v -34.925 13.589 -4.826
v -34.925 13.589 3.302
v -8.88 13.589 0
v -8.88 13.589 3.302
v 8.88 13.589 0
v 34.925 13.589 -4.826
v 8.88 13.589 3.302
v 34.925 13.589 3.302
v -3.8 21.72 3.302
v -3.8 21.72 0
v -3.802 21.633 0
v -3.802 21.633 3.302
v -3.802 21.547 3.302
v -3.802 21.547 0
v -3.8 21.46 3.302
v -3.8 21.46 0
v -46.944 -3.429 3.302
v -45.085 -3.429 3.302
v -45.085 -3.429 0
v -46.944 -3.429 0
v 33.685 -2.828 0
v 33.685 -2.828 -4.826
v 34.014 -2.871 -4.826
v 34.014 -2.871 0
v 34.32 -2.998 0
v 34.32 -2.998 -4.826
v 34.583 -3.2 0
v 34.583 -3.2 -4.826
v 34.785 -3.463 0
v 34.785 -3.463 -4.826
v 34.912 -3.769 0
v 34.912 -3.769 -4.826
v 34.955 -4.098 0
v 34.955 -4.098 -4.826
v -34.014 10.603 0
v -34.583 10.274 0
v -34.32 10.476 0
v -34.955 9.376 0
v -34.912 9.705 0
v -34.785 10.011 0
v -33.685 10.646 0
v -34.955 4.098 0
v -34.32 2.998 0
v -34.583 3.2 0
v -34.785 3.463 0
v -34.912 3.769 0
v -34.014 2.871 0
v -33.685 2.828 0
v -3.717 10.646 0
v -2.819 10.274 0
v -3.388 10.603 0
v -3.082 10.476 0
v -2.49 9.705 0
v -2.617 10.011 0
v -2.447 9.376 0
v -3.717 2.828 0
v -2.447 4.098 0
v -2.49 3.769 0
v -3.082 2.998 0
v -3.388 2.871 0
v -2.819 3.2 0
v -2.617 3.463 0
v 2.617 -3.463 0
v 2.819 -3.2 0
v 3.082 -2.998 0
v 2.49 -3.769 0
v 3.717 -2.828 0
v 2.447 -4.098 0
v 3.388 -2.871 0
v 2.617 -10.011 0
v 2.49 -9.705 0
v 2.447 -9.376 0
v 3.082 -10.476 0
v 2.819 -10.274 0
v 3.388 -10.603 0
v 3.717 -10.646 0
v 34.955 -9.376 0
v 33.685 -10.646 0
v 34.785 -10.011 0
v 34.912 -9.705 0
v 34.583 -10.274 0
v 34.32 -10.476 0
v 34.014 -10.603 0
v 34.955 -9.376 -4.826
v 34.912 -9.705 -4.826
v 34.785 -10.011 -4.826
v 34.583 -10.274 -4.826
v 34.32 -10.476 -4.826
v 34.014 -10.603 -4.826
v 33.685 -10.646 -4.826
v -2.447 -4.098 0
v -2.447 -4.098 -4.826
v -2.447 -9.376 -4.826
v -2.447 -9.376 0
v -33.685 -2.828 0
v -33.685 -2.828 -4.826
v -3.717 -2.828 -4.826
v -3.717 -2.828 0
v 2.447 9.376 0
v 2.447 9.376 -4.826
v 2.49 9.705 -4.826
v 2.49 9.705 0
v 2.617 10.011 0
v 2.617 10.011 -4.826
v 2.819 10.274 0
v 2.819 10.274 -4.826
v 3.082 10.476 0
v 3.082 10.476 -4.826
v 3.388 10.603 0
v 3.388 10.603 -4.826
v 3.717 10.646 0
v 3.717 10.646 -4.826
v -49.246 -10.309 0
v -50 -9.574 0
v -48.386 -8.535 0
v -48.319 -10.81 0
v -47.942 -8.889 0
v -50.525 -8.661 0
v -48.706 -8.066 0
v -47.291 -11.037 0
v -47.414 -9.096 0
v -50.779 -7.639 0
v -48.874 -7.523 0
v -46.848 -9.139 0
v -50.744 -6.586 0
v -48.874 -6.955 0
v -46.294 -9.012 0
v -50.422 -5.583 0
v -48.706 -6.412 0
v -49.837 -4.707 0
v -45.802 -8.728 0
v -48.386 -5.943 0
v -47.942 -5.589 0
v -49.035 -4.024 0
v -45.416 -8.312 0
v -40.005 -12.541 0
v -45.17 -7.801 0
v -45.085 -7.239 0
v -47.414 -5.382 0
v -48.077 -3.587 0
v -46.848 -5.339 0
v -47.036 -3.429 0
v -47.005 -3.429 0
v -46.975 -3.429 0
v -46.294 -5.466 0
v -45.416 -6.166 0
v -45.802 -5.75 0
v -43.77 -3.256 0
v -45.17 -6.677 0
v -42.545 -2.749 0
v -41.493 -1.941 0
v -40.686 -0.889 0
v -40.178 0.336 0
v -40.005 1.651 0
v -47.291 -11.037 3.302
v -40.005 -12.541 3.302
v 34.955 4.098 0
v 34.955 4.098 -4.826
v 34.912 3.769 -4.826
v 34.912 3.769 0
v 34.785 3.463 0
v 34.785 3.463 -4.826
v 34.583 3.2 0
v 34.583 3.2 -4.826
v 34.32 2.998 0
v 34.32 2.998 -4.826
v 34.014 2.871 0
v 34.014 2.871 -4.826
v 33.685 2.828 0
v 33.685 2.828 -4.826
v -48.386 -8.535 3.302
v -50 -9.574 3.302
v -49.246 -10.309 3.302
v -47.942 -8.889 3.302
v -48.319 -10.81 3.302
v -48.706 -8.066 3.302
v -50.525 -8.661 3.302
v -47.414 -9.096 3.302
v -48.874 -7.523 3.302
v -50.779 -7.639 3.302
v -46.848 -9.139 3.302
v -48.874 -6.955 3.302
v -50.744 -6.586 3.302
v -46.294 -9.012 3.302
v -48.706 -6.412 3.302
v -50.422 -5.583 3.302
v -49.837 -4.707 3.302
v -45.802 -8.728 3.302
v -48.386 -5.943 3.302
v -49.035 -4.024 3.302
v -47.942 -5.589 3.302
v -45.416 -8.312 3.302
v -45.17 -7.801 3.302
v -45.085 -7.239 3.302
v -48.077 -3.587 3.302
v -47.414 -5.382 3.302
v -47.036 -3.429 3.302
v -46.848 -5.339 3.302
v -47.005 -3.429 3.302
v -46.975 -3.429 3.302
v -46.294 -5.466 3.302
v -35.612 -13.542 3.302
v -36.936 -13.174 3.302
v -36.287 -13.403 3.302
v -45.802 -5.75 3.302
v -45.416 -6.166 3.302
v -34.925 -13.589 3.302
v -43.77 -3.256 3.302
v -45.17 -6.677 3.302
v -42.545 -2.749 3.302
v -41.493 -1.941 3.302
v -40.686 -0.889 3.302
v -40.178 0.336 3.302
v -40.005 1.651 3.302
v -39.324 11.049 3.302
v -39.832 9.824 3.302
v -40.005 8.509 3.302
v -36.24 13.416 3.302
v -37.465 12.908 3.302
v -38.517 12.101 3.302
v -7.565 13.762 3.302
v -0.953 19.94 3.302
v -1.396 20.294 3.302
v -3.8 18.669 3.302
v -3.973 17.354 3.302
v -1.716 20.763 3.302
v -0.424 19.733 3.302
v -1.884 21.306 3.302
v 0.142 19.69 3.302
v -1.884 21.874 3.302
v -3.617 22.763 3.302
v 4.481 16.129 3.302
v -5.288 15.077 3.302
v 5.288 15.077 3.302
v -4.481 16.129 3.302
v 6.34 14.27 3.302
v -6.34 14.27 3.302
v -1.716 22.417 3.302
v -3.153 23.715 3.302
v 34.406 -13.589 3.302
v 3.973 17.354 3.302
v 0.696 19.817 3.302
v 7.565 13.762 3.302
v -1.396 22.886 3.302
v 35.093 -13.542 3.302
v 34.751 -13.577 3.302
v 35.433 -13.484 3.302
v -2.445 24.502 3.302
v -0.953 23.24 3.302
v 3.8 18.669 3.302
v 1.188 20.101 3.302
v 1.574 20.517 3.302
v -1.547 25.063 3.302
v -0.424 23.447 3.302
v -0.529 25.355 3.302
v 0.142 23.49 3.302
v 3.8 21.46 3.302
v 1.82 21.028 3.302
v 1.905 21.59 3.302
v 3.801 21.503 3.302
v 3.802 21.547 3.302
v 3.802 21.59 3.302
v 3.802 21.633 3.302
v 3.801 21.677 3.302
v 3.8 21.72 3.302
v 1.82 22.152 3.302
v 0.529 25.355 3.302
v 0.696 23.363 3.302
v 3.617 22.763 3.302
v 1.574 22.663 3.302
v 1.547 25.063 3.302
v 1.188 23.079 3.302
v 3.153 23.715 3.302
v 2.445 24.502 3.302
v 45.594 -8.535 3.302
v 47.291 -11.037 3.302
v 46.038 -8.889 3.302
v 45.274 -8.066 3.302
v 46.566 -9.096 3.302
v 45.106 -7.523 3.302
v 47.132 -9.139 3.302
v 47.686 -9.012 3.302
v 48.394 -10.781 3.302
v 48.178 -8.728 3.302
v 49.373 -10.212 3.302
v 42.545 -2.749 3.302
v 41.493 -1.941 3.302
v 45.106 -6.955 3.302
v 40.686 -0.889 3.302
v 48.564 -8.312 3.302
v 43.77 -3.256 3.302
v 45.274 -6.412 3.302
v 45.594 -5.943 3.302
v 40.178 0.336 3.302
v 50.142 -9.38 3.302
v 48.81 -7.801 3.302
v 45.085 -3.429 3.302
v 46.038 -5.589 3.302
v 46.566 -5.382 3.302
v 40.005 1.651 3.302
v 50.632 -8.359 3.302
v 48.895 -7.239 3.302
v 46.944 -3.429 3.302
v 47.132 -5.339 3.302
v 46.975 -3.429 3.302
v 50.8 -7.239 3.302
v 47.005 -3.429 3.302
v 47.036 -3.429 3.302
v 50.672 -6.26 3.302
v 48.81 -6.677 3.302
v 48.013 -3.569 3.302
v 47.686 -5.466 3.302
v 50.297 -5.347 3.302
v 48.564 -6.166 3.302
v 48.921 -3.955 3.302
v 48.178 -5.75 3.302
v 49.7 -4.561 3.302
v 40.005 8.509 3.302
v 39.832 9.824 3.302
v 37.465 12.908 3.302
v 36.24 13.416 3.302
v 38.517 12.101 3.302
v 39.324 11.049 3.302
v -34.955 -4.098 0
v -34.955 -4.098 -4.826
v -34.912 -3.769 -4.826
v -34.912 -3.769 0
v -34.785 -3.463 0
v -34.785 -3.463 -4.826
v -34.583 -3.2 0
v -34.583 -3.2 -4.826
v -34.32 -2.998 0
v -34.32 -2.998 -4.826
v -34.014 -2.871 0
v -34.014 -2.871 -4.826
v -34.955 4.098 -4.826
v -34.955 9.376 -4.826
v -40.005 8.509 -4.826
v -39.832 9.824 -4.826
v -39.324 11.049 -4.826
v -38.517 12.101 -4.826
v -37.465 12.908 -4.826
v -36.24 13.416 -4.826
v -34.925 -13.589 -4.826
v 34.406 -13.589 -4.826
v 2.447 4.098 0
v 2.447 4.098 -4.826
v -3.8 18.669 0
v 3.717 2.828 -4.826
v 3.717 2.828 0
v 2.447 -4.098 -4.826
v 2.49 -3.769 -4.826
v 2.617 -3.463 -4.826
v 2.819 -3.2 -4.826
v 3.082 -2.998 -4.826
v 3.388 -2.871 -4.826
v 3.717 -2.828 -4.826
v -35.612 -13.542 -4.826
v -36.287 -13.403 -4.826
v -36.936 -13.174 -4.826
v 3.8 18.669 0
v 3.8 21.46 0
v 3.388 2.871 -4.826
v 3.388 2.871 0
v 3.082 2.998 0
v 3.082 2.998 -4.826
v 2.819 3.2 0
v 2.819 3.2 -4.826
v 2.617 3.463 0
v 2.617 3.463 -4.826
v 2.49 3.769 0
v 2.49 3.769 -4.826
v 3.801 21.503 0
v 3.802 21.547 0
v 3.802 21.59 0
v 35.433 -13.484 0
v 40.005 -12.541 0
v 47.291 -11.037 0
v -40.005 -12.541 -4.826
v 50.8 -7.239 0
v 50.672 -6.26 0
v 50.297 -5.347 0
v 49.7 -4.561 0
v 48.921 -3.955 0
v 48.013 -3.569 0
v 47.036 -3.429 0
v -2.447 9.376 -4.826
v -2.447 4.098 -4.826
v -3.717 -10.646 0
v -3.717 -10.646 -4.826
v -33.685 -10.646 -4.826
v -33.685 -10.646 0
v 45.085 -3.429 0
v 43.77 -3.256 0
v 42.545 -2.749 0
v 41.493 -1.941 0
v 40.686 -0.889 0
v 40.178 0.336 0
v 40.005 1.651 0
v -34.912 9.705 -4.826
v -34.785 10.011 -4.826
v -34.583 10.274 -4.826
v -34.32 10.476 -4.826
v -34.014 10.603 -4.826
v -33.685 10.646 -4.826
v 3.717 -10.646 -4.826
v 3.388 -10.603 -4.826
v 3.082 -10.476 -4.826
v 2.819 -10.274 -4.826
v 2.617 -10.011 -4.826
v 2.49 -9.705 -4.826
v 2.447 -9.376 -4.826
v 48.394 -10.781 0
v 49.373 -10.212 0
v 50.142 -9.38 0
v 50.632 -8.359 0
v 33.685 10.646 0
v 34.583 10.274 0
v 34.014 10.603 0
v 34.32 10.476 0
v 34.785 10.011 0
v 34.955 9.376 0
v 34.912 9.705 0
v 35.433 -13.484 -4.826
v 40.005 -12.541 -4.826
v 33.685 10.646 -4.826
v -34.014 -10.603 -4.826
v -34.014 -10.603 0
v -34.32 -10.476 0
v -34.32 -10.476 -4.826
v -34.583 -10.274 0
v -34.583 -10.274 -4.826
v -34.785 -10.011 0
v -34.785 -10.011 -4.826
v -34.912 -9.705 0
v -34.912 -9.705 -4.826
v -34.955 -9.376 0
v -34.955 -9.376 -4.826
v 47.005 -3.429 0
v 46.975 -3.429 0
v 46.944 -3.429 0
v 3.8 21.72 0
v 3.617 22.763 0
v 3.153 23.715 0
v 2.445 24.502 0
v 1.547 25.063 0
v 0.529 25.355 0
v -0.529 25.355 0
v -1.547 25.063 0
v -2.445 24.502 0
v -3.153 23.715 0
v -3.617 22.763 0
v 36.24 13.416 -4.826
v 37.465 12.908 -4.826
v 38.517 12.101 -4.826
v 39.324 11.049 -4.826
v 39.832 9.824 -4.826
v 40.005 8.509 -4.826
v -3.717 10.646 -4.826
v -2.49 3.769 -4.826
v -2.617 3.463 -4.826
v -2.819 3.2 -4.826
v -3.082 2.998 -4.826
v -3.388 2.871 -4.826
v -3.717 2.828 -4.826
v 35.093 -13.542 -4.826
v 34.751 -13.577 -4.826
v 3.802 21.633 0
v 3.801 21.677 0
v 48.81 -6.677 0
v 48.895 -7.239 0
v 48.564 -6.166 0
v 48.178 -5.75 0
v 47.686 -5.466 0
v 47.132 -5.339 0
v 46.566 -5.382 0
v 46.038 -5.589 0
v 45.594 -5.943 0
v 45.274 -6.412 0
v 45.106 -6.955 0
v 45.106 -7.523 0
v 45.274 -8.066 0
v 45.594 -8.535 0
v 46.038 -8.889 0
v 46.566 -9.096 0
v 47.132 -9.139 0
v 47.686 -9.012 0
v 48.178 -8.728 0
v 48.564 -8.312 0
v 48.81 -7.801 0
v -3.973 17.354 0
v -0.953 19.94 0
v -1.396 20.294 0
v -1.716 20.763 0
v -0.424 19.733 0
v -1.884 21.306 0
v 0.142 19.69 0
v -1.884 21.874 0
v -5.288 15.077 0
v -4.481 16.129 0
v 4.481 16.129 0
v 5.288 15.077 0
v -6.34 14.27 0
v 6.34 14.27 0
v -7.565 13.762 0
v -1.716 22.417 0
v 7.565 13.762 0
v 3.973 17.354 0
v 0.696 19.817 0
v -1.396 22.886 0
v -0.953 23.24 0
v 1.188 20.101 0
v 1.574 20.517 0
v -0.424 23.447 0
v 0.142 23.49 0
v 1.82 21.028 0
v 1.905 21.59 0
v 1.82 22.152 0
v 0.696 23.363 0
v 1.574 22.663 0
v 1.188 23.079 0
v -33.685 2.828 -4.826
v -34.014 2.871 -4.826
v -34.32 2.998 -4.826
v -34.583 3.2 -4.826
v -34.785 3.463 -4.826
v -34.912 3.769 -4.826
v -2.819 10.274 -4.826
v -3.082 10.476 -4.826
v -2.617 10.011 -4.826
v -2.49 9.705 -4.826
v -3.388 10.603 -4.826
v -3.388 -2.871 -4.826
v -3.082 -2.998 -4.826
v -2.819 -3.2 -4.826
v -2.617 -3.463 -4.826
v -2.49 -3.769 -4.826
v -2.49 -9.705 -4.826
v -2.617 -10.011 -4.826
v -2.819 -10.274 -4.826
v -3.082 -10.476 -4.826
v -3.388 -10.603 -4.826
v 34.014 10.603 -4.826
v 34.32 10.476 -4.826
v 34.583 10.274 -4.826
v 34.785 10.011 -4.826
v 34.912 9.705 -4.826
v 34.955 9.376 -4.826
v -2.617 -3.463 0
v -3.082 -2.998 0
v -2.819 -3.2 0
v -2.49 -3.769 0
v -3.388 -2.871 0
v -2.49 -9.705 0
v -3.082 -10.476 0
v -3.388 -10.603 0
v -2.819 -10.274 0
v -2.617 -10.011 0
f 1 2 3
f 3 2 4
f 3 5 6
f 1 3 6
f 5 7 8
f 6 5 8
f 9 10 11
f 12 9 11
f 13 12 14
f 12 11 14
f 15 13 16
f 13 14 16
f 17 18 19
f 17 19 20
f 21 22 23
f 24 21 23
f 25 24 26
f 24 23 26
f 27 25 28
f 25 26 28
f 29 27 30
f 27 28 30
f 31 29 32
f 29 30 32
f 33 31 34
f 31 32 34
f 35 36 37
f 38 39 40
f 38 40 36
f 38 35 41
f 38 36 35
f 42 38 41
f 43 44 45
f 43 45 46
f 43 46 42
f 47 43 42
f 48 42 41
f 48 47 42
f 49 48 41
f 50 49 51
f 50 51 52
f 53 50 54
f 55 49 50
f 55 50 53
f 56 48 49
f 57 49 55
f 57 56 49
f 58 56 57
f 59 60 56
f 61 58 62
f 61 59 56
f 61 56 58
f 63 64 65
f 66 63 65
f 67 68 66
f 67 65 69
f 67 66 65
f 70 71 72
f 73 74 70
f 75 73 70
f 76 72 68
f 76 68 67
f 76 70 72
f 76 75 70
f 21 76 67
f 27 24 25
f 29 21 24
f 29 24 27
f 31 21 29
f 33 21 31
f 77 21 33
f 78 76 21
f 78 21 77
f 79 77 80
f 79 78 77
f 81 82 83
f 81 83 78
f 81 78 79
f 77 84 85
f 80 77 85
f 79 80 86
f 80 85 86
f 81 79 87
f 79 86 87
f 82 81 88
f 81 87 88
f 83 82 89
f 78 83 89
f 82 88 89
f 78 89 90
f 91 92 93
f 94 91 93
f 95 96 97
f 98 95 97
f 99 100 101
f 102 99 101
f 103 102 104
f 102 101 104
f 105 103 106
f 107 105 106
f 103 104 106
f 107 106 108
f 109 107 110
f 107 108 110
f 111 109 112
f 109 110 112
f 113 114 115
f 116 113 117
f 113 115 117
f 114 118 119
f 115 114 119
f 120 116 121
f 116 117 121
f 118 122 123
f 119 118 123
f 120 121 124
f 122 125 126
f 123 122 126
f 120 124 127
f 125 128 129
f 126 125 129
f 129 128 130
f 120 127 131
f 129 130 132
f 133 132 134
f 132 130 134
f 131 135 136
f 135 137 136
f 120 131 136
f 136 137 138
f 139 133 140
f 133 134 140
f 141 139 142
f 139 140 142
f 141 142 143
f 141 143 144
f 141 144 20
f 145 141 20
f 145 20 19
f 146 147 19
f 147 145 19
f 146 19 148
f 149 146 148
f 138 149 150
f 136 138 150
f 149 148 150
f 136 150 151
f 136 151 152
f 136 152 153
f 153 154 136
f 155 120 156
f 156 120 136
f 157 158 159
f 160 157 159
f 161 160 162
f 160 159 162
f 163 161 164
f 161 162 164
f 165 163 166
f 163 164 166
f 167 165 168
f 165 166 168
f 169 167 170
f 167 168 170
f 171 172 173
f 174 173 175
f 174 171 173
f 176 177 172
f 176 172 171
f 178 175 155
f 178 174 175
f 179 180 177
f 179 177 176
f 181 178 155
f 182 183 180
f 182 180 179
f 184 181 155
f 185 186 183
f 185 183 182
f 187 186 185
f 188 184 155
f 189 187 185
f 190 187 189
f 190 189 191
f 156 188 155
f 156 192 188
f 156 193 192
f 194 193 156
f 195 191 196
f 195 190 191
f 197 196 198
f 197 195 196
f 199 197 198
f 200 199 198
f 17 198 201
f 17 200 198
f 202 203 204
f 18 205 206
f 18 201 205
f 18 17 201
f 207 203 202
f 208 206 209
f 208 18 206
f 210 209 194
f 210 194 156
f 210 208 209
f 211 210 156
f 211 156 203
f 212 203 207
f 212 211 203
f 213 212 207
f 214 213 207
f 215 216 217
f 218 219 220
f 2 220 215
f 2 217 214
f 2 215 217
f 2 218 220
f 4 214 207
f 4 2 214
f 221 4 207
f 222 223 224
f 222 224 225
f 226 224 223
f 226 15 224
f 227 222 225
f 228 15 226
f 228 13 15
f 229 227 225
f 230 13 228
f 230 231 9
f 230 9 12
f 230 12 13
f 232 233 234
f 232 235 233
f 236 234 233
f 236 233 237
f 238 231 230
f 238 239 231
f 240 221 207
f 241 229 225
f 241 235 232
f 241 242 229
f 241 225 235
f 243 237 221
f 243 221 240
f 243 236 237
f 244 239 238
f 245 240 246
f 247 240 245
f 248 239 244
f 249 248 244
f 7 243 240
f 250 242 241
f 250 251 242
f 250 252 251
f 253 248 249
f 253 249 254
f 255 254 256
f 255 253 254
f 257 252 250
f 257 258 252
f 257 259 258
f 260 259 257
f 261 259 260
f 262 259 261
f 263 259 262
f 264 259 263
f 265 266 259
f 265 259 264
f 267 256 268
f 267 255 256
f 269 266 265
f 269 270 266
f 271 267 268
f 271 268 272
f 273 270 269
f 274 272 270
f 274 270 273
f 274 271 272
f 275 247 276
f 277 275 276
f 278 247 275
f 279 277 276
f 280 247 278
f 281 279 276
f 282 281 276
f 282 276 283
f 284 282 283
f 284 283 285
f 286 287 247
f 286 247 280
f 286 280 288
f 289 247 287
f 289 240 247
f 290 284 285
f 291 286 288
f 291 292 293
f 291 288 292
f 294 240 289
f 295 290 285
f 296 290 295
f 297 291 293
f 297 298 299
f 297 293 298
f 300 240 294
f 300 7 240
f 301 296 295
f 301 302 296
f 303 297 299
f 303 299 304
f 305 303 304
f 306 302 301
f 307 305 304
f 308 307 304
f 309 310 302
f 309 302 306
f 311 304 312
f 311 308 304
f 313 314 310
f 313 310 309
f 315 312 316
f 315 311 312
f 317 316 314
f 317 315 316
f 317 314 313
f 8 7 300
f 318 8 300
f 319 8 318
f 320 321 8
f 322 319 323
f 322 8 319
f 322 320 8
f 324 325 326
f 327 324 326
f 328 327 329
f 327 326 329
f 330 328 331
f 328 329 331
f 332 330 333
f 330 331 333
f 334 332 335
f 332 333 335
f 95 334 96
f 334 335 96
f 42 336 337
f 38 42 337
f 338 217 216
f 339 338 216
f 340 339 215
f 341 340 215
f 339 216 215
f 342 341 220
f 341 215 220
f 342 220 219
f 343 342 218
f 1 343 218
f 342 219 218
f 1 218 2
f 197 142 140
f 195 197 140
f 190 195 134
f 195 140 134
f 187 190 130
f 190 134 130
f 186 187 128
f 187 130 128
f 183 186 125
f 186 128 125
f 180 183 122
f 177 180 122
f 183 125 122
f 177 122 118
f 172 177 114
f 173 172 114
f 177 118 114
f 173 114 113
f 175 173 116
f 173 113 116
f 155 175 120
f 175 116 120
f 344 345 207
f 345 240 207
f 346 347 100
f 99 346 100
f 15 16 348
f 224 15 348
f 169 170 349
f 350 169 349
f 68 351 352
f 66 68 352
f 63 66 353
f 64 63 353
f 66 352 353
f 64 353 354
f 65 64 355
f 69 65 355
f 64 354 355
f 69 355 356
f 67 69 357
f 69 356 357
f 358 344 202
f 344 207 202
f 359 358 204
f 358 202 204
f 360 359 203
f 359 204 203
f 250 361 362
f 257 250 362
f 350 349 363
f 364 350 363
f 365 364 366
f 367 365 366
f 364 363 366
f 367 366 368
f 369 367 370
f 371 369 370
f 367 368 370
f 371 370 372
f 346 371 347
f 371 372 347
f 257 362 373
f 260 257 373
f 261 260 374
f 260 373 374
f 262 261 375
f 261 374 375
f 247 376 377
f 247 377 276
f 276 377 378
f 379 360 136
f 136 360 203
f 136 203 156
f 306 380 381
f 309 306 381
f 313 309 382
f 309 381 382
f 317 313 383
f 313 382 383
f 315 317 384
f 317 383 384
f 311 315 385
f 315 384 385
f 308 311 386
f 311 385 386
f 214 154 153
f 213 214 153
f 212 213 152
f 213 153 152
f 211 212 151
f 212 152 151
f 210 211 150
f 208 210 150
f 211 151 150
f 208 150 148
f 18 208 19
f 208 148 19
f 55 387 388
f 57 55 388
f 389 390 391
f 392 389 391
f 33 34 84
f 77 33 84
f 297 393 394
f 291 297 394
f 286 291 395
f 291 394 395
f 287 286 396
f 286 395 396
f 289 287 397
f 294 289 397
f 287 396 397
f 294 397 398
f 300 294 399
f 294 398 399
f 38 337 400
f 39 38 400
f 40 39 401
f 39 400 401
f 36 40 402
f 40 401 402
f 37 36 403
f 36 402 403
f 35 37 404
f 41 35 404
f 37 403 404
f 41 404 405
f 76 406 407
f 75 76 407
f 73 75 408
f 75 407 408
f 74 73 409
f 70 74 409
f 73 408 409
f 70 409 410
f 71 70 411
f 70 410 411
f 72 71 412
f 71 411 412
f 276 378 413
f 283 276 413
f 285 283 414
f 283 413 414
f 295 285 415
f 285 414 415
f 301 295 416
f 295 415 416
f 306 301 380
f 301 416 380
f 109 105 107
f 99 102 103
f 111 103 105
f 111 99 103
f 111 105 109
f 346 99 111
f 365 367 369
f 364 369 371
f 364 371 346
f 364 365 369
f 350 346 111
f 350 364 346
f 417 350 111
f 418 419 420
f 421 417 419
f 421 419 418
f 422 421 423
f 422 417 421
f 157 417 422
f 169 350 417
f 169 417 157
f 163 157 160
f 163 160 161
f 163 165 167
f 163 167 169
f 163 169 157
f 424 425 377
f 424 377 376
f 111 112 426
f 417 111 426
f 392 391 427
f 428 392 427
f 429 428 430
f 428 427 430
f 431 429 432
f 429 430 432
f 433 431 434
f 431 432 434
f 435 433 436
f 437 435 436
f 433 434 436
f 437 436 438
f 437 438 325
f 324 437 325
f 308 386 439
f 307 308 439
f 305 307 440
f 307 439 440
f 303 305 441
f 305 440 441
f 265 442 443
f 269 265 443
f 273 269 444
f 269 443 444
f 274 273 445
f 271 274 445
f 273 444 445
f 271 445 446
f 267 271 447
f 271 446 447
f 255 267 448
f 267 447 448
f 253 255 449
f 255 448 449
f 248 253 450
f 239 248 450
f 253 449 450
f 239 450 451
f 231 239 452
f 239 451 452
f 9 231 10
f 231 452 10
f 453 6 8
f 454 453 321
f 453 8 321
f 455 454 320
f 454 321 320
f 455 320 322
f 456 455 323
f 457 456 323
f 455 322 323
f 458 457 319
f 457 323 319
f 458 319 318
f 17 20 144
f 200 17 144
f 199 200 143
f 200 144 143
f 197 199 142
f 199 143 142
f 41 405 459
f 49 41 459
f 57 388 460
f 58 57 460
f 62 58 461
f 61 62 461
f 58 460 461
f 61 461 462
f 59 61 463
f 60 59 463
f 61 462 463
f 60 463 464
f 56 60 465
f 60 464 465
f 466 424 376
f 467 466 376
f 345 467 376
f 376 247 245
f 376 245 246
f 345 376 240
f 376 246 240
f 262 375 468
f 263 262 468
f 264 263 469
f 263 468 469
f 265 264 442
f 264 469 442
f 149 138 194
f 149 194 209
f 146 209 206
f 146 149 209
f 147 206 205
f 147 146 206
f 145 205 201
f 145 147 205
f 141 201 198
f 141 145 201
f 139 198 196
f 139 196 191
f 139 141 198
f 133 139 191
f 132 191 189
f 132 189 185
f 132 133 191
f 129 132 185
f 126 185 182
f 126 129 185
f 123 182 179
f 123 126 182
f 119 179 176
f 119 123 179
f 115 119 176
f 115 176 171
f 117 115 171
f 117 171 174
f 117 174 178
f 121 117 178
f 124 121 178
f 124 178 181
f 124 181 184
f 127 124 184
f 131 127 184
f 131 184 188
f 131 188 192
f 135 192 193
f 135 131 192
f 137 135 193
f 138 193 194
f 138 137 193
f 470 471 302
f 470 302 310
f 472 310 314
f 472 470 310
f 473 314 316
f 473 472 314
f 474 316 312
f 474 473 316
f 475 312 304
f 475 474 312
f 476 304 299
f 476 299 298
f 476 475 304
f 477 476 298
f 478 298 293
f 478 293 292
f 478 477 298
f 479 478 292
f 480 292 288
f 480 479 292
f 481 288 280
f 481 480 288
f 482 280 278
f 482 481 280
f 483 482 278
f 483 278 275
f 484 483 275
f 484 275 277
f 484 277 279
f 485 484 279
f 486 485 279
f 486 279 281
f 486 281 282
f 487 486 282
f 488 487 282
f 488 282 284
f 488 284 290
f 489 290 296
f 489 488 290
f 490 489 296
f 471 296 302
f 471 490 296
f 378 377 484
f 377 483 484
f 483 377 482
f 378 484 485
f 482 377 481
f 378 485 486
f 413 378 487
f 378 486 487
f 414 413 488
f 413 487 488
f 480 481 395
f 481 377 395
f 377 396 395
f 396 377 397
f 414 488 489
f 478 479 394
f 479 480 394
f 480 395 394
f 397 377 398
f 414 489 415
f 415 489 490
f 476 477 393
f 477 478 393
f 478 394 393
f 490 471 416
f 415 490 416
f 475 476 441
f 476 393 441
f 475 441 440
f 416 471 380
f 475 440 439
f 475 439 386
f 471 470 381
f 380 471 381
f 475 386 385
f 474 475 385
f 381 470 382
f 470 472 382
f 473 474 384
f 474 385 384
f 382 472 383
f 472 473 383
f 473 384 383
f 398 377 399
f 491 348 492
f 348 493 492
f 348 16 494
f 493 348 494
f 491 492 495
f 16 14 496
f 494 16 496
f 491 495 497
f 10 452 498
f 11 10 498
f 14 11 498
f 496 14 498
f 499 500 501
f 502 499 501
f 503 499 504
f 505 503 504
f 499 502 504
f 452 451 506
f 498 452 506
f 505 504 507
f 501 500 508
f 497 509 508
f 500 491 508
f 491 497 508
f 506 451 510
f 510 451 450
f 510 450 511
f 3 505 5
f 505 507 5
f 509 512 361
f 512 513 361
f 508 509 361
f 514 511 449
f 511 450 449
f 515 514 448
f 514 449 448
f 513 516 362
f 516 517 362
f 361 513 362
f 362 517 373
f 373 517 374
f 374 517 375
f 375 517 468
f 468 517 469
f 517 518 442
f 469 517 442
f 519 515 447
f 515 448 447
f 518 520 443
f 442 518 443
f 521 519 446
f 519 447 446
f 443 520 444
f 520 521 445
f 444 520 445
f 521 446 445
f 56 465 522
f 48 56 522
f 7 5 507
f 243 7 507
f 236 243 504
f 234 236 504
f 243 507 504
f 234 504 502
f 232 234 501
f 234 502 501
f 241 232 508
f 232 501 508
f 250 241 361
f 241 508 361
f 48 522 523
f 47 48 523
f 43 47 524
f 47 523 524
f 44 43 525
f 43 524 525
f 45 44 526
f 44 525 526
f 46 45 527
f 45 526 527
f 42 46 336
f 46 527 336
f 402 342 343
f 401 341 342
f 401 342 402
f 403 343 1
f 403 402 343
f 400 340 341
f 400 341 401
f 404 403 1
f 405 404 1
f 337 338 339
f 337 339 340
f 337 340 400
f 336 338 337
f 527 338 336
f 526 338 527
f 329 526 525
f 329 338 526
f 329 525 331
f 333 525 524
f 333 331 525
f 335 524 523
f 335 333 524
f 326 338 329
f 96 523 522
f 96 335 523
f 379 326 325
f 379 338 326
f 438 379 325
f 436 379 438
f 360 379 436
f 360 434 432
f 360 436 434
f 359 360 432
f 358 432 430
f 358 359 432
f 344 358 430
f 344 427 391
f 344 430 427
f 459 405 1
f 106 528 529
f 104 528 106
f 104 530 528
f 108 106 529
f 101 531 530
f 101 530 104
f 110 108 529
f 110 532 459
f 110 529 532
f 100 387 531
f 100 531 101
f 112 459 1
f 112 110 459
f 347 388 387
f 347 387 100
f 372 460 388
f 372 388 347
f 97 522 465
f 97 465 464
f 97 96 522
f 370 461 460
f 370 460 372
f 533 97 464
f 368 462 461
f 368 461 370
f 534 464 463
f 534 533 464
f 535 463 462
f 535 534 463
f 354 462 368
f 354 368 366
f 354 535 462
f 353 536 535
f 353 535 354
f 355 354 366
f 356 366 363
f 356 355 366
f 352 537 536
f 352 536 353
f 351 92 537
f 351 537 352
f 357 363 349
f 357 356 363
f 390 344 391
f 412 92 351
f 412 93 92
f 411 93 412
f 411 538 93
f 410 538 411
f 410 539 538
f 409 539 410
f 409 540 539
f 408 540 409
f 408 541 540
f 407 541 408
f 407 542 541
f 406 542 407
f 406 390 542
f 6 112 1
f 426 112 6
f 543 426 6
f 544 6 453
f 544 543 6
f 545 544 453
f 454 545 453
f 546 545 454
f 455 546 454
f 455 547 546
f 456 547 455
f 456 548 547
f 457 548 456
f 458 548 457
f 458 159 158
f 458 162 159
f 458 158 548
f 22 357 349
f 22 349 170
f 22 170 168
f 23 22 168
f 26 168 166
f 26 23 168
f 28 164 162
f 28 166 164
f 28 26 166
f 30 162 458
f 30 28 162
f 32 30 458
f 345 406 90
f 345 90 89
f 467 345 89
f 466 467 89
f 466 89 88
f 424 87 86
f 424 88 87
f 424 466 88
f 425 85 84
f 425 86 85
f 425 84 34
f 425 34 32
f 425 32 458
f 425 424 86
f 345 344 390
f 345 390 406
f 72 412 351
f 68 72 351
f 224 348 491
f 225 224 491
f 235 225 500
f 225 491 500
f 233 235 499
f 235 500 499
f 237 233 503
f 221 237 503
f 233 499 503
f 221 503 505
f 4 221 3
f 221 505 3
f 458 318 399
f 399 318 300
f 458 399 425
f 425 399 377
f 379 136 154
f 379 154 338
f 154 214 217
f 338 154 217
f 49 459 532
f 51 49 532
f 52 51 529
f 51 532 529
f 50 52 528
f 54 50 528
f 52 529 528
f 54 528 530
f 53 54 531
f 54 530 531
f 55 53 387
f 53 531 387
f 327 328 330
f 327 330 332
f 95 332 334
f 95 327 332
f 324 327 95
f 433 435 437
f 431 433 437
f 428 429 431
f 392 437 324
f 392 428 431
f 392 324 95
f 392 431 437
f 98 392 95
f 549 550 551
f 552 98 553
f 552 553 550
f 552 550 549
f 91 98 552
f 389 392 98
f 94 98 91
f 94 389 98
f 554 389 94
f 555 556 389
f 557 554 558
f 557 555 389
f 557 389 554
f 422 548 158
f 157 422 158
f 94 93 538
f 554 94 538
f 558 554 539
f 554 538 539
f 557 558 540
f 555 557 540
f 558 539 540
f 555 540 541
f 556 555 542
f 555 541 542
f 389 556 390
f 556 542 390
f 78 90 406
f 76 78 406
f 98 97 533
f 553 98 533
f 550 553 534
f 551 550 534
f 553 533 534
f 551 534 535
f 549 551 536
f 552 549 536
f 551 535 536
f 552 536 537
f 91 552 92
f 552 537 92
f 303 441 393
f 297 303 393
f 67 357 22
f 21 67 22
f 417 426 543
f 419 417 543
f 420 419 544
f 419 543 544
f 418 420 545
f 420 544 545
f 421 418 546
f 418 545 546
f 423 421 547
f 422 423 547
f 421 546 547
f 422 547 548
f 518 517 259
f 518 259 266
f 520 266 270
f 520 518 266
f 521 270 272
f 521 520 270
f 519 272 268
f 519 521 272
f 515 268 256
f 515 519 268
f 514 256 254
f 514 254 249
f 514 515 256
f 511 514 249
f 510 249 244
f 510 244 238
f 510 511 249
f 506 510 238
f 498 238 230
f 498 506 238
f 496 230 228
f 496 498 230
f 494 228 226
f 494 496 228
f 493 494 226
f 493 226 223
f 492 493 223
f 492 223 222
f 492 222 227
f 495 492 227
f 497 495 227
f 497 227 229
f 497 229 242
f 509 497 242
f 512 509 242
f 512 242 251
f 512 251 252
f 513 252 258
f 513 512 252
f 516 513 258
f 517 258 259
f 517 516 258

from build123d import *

# Parameters (mm, degrees)
F0_R     = 1.905
F1_DEPTH = 3.302
F3_DEPTH = 4.826
F5_DEPTH = 4.826


with BuildPart() as f1:
    # F0 (on Top) → F1 (new body)
    with BuildSketch(Plane.XY):
        with BuildLine():
            Line((-8.88014, 13.589), (-34.925, 13.589))
            ThreePointArc((-34.925, 13.589), (-38.517102, 12.101102), (-40.005, 8.509))
            Line((-40.005, 8.509), (-40.005, 1.650725))
            Line((-40.005, 1.650725), (-40.005, -12.540665))
            Line((-40.005, -12.540665), (-36.936027, -13.173994))
            ThreePointArc((-36.936027, -13.173994), (-35.951701, -13.484167), (-34.925, -13.589))
            Line((-34.925, -13.589), (34.406297, -13.589))
            ThreePointArc((34.406297, -13.589), (34.922317, -13.562724), (35.432998, -13.484167))
            Line((35.432998, -13.484167), (47.290979, -11.037093))
            ThreePointArc((47.290979, -11.037093), (43.183951, -7.412463), (46.944249, -3.429275))
            Line((46.944249, -3.429275), (45.085, -3.429275))
            ThreePointArc((45.085, -3.429275), (41.492898, -1.941377), (40.005, 1.650725))
            Line((40.005, 1.650725), (40.005, 8.509))
            ThreePointArc((40.005, 8.509), (38.517102, 12.101102), (34.925, 13.589))
            Line((34.925, 13.589), (8.88014, 13.589))
            ThreePointArc((8.88014, 13.589), (5.288038, 15.076898), (3.80014, 18.669))
            Line((3.80014, 18.669), (3.80014, 21.459575))
            ThreePointArc((3.80014, 21.459575), (0, 17.787622), (-3.80014, 21.459575))
            Line((-3.80014, 21.459575), (-3.80014, 18.669))
            ThreePointArc((-3.80014, 18.669), (-5.288038, 15.076898), (-8.88014, 13.589))
        make_face()
        with BuildLine():
            Line((-40.005, -12.540665), (-40.005, 1.650725))
            ThreePointArc((-40.005, 1.650725), (-41.492898, -1.941377), (-45.085, -3.429275))
            Line((-45.085, -3.429275), (-46.944249, -3.429275))
            ThreePointArc((-46.944249, -3.429275), (-44.279796, -4.561147), (-43.18, -7.239))
            ThreePointArc((-43.18, -7.239), (-44.404524, -10.037467), (-47.290979, -11.037093))
            Line((-47.290979, -11.037093), (-40.005, -12.540665))
        make_face()
        with BuildLine():
            Line((-3.80014, 21.720425), (-3.80014, 21.459575))
            ThreePointArc((-3.80014, 21.459575), (0, 17.787622), (3.80014, 21.459575))
            Line((3.80014, 21.459575), (3.80014, 21.720425))
            ThreePointArc((3.80014, 21.720425), (0, 25.392378), (-3.80014, 21.720425))
        make_face()
        with Locations((0, 21.59)):
            Circle(F0_R, mode=Mode.SUBTRACT)
        with BuildLine():
            ThreePointArc((-3.80014, 21.720425), (-3.802378, 21.59), (-3.80014, 21.459575))
            Line((-3.80014, 21.459575), (-3.80014, 21.720425))
        make_face()
        with BuildLine():
            Line((3.80014, 21.720425), (3.80014, 21.459575))
            ThreePointArc((3.80014, 21.459575), (3.801818, 21.524778), (3.802378, 21.59))
            ThreePointArc((3.802378, 21.59), (3.801818, 21.655222), (3.80014, 21.720425))
        make_face()
        with BuildLine():
            Line((-47.035751, -3.429275), (-46.944249, -3.429275))
            ThreePointArc((-46.944249, -3.429275), (-46.99, -3.429), (-47.035751, -3.429275))
        make_face()
        with BuildLine():
            ThreePointArc((-43.18, -7.239), (-44.279796, -4.561147), (-46.944249, -3.429275))
            Line((-46.944249, -3.429275), (-47.035751, -3.429275))
            ThreePointArc((-47.035751, -3.429275), (-50.797858, -7.111254), (-47.290979, -11.037093))
            ThreePointArc((-47.290979, -11.037093), (-44.404524, -10.037467), (-43.18, -7.239))
        make_face()
        with Locations((-46.99, -7.239)):
            Circle(F0_R, mode=Mode.SUBTRACT)
        with BuildLine():
            ThreePointArc((46.944249, -3.429275), (43.183951, -7.412463), (47.290979, -11.037093))
            ThreePointArc((47.290979, -11.037093), (49.788467, -9.824476), (50.8, -7.239))
            ThreePointArc((50.8, -7.239), (49.700204, -4.561147), (47.035751, -3.429275))
            Line((47.035751, -3.429275), (46.944249, -3.429275))
        make_face()
        with Locations((46.99, -7.239)):
            Circle(F0_R, mode=Mode.SUBTRACT)
        with BuildLine():
            ThreePointArc((47.035751, -3.429275), (46.99, -3.429), (46.944249, -3.429275))
            Line((46.944249, -3.429275), (47.035751, -3.429275))
        make_face()
    extrude(amount=F1_DEPTH)

    # F2 (on face) → F3 (join)
    with BuildSketch(Plane(origin=(0, 0, 0), x_dir=(1, 0, 0), z_dir=(0, 0, -1))):
        with BuildLine():
            Line((-40.005, -1.650725), (-40.005, -5.079863))
            Line((-40.005, -5.079863), (-40.005, -8.509))
            ThreePointArc((-40.005, -8.509), (-38.517102, -12.101102), (-34.925, -13.589))
            Line((-34.925, -13.589), (-13.131685, -13.589))
            Line((-13.131685, -13.589), (-8.88014, -13.589))
            Line((-8.88014, -13.589), (8.88014, -13.589))
            Line((8.88014, -13.589), (9.643361, -13.589))
            Line((9.643361, -13.589), (34.925, -13.589))
            ThreePointArc((34.925, -13.589), (38.517102, -12.101102), (40.005, -8.509))
            Line((40.005, -8.509), (40.005, -5.079863))
            Line((40.005, -5.079863), (40.005, -1.650725))
            Line((40.005, -1.650725), (40.005, 12.540665))
            Line((40.005, 12.540665), (35.432998, 13.484167))
            ThreePointArc((35.432998, 13.484167), (34.922317, 13.562724), (34.406297, 13.589))
            Line((34.406297, 13.589), (-34.925, 13.589))
            ThreePointArc((-34.925, 13.589), (-35.951701, 13.484167), (-36.936027, 13.173994))
            Line((-36.936027, 13.173994), (-40.005, 12.540665))
            Line((-40.005, 12.540665), (-40.005, -1.650725))
        make_face()
    extrude(amount=F3_DEPTH)

    # F4 (on face) → F5 (cut)
    with BuildSketch(Plane(origin=(0, 0, -4.826), x_dir=(1, 0, 0), z_dir=(0, 0, -1))):
        with BuildLine():
            ThreePointArc((-34.955431, 4.09772), (-34.583456, 3.199695), (-33.685431, 2.82772))
            Line((-33.685431, 2.82772), (-3.716994, 2.82772))
            ThreePointArc((-3.716994, 2.82772), (-2.818968, 3.199695), (-2.446994, 4.09772))
            Line((-2.446994, 4.09772), (-2.446994, 9.376206))
            ThreePointArc((-2.446994, 9.376206), (-2.818968, 10.274232), (-3.716994, 10.646206))
            Line((-3.716994, 10.646206), (-33.685431, 10.646206))
            ThreePointArc((-33.685431, 10.646206), (-34.583456, 10.274232), (-34.955431, 9.376206))
            Line((-34.955431, 9.376206), (-34.955431, 4.09772))
        make_face()
        with BuildLine():
            ThreePointArc((3.716994, 10.646206), (2.818968, 10.274232), (2.446994, 9.376206))
            Line((2.446994, 9.376206), (2.446994, 4.09772))
            ThreePointArc((2.446994, 4.09772), (2.818968, 3.199695), (3.716994, 2.82772))
            Line((3.716994, 2.82772), (33.685431, 2.82772))
            ThreePointArc((33.685431, 2.82772), (34.583456, 3.199695), (34.955431, 4.09772))
            Line((34.955431, 4.09772), (34.955431, 9.376206))
            ThreePointArc((34.955431, 9.376206), (34.583456, 10.274232), (33.685431, 10.646206))
            Line((33.685431, 10.646206), (3.716994, 10.646206))
        make_face()
        with BuildLine():
            Line((-3.716994, -2.82772), (-33.685431, -2.82772))
            ThreePointArc((-33.685431, -2.82772), (-34.583456, -3.199695), (-34.955431, -4.09772))
            Line((-34.955431, -4.09772), (-34.955431, -9.376206))
            ThreePointArc((-34.955431, -9.376206), (-34.583456, -10.274232), (-33.685431, -10.646206))
            Line((-33.685431, -10.646206), (-3.716994, -10.646206))
            ThreePointArc((-3.716994, -10.646206), (-2.818968, -10.274232), (-2.446994, -9.376206))
            Line((-2.446994, -9.376206), (-2.446994, -4.09772))
            ThreePointArc((-2.446994, -4.09772), (-2.818968, -3.199695), (-3.716994, -2.82772))
        make_face()
        with BuildLine():
            Line((2.446994, -4.09772), (2.446994, -9.376206))
            ThreePointArc((2.446994, -9.376206), (2.818968, -10.274232), (3.716994, -10.646206))
            Line((3.716994, -10.646206), (33.685431, -10.646206))
            ThreePointArc((33.685431, -10.646206), (34.583456, -10.274232), (34.955431, -9.376206))
            Line((34.955431, -9.376206), (34.955431, -4.09772))
            ThreePointArc((34.955431, -4.09772), (34.583456, -3.199695), (33.685431, -2.82772))
            Line((33.685431, -2.82772), (3.716994, -2.82772))
            ThreePointArc((3.716994, -2.82772), (2.818968, -3.199695), (2.446994, -4.09772))
        make_face()
    extrude(amount=-F5_DEPTH, mode=Mode.SUBTRACT)


solid = f1.part
